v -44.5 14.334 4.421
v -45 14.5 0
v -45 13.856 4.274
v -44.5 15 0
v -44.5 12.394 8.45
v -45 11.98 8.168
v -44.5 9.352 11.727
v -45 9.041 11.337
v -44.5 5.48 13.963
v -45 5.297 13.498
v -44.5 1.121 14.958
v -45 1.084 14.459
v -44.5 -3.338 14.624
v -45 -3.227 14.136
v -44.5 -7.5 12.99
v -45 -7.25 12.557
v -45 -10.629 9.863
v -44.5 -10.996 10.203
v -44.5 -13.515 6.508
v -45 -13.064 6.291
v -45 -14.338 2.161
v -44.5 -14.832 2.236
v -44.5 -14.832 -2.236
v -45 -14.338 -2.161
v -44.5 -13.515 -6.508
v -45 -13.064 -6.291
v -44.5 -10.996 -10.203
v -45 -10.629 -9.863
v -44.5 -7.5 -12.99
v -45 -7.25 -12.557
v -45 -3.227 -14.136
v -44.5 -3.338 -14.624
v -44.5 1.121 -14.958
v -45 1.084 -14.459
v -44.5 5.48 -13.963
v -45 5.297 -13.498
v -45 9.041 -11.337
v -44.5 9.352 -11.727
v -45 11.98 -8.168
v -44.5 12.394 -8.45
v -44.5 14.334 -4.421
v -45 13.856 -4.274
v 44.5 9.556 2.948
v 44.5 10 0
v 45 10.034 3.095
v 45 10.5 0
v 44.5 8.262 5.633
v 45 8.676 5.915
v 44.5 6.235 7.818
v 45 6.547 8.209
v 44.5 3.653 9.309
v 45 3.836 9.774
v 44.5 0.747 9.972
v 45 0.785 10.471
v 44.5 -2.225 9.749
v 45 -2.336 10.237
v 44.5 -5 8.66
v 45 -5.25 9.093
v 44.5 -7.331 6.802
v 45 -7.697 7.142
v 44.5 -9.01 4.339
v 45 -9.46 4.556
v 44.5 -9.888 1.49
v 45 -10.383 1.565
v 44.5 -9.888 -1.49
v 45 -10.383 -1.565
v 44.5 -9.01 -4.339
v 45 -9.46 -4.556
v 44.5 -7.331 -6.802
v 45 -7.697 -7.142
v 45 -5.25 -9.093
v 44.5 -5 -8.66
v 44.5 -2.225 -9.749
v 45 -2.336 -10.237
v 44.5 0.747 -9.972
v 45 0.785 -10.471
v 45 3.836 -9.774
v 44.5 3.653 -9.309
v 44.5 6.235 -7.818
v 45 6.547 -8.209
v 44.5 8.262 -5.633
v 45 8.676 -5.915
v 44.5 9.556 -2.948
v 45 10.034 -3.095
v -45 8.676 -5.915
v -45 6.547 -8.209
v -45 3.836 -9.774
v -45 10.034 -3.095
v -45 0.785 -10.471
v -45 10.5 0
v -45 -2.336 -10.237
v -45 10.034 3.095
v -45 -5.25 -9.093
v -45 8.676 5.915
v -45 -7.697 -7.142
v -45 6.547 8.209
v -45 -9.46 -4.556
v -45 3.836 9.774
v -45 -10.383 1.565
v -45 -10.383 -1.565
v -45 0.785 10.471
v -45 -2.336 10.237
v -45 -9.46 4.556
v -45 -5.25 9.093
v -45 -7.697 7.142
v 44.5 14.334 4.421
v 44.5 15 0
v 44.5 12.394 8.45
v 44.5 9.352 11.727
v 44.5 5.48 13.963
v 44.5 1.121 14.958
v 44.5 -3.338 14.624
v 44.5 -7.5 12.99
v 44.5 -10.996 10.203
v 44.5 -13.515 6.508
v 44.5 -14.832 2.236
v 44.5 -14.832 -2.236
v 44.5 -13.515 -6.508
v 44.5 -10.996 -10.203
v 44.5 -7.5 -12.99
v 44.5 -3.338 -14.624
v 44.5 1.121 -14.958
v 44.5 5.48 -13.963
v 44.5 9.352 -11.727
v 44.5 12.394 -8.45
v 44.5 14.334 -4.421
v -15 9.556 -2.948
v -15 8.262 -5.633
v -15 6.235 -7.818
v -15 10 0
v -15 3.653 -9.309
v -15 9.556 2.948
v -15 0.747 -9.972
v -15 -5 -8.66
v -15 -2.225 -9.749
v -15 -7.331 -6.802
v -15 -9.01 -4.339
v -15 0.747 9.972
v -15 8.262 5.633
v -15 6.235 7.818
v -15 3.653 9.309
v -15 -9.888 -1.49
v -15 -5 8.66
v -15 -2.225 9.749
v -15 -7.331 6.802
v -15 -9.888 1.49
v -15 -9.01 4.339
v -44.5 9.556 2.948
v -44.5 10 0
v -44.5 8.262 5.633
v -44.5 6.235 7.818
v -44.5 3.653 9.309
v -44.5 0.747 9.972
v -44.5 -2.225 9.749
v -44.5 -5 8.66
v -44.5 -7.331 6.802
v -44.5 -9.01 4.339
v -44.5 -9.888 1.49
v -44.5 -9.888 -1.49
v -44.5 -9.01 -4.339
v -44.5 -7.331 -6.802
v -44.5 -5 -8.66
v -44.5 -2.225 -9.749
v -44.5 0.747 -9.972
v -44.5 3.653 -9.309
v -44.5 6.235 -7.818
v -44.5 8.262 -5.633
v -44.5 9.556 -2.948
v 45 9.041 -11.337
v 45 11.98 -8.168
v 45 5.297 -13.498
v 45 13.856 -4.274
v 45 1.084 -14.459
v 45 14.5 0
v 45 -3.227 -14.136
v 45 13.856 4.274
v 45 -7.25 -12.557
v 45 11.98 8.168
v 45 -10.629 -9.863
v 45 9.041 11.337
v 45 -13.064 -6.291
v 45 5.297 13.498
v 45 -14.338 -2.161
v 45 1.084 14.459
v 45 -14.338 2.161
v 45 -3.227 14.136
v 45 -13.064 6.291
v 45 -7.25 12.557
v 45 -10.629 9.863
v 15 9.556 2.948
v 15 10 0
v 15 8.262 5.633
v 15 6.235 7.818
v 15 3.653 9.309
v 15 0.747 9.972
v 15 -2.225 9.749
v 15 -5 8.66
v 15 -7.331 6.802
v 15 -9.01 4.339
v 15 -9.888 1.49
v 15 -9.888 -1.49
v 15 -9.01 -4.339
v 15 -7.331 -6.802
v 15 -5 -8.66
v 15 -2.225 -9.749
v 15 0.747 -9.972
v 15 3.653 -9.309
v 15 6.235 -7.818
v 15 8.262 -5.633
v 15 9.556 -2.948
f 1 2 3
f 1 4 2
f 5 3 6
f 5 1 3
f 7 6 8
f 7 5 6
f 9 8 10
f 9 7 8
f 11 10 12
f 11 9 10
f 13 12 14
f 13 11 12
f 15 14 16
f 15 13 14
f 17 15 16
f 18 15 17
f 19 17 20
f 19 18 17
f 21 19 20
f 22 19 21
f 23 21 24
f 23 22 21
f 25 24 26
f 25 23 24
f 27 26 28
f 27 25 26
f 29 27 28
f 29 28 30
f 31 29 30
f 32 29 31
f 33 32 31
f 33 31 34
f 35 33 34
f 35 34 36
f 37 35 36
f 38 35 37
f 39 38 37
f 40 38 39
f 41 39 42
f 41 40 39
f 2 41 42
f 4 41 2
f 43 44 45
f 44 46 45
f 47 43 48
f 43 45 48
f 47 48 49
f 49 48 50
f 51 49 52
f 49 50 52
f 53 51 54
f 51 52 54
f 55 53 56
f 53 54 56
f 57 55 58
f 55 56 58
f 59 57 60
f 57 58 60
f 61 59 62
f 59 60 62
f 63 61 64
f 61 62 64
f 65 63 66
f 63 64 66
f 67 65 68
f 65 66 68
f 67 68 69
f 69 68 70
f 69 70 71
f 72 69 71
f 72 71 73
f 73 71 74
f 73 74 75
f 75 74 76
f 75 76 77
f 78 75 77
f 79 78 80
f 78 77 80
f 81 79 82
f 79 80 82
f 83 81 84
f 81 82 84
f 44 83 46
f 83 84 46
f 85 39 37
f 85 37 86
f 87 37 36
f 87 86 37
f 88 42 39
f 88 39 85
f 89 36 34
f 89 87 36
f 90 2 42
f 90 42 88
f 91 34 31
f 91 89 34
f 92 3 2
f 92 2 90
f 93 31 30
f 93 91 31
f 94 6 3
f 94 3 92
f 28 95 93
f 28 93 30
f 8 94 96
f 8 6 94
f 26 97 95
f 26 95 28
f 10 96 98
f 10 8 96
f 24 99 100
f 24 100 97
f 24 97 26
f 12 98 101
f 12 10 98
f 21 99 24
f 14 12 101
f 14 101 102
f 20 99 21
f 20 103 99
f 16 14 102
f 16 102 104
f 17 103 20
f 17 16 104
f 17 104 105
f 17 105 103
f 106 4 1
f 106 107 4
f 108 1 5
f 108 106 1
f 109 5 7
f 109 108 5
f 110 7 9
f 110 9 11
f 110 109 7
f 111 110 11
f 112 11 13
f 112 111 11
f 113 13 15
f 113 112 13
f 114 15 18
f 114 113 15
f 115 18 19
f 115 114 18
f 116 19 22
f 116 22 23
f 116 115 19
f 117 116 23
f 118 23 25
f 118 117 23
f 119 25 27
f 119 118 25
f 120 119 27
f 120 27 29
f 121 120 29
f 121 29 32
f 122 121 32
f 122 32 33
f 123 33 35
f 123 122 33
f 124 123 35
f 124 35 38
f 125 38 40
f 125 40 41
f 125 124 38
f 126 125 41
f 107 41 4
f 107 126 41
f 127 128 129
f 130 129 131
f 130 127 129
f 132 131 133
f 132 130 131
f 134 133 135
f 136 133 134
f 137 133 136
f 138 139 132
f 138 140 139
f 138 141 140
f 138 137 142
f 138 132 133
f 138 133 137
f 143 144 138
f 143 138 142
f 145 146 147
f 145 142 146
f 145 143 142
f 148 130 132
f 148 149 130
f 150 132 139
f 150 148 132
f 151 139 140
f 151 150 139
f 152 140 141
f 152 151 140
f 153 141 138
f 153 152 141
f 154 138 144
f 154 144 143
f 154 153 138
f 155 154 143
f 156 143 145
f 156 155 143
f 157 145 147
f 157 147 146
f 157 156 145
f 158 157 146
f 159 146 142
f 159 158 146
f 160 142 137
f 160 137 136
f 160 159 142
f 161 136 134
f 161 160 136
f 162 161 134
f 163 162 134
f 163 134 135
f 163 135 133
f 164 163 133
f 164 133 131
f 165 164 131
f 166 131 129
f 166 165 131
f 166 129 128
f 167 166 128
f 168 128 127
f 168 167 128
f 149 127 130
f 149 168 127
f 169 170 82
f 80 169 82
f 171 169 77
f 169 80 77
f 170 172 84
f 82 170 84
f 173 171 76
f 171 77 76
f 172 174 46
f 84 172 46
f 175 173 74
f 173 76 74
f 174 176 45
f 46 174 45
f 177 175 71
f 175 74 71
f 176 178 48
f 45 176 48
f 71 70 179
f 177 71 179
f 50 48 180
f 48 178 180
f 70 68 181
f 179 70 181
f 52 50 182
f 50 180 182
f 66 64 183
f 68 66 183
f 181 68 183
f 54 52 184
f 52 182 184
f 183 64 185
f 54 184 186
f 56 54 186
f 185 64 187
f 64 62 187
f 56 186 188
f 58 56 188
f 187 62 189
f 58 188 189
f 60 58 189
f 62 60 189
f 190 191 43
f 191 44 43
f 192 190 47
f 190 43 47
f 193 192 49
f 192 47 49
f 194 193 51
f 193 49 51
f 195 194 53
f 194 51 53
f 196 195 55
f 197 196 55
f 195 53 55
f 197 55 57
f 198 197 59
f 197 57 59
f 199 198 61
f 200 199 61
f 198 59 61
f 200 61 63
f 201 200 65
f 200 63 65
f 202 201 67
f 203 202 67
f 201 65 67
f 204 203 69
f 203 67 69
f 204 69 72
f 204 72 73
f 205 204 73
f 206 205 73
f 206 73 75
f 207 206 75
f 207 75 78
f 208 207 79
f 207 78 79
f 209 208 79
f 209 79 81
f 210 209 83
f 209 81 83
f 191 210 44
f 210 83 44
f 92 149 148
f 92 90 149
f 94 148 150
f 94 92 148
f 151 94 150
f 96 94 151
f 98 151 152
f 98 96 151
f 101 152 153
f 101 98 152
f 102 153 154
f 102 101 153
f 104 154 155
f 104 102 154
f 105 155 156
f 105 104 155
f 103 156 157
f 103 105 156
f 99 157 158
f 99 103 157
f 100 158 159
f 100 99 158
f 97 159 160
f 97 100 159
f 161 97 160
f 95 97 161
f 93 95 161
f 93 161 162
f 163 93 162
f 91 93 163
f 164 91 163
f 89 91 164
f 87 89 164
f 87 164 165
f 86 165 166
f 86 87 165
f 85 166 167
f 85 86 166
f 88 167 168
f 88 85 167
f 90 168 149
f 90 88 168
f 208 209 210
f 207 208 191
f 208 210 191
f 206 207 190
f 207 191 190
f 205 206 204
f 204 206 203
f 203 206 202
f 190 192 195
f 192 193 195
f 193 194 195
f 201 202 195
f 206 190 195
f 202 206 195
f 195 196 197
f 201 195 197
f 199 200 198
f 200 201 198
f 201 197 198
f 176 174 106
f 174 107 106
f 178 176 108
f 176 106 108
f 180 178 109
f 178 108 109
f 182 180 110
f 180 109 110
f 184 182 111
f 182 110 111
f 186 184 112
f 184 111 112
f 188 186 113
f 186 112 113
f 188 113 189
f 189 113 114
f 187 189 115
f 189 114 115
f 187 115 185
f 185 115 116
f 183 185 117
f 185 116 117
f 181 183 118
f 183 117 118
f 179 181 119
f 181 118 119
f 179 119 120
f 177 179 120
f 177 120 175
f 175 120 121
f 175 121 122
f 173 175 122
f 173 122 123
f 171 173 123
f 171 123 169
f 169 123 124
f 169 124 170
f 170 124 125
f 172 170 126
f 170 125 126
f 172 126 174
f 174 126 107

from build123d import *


with BuildPart() as f1:
    # F0 (on Top) → F1 (revolve)
    with BuildSketch(Plane.XY):
        Polygon((0, 0), (15, 0), (15, 10), (44.5, 10), (45, 10.5), (45, 14.5), (44.5, 15), (0, 15), align=None)
    revolve(axis=Axis((23.765821, 0, 0), (1, 0, 0)))

    # F2: F1 across plane


with BuildPart() as f1_1:
    add(f1.part)
    add(f1.part.mirror(Plane.YZ))


solid = f1_1.part
